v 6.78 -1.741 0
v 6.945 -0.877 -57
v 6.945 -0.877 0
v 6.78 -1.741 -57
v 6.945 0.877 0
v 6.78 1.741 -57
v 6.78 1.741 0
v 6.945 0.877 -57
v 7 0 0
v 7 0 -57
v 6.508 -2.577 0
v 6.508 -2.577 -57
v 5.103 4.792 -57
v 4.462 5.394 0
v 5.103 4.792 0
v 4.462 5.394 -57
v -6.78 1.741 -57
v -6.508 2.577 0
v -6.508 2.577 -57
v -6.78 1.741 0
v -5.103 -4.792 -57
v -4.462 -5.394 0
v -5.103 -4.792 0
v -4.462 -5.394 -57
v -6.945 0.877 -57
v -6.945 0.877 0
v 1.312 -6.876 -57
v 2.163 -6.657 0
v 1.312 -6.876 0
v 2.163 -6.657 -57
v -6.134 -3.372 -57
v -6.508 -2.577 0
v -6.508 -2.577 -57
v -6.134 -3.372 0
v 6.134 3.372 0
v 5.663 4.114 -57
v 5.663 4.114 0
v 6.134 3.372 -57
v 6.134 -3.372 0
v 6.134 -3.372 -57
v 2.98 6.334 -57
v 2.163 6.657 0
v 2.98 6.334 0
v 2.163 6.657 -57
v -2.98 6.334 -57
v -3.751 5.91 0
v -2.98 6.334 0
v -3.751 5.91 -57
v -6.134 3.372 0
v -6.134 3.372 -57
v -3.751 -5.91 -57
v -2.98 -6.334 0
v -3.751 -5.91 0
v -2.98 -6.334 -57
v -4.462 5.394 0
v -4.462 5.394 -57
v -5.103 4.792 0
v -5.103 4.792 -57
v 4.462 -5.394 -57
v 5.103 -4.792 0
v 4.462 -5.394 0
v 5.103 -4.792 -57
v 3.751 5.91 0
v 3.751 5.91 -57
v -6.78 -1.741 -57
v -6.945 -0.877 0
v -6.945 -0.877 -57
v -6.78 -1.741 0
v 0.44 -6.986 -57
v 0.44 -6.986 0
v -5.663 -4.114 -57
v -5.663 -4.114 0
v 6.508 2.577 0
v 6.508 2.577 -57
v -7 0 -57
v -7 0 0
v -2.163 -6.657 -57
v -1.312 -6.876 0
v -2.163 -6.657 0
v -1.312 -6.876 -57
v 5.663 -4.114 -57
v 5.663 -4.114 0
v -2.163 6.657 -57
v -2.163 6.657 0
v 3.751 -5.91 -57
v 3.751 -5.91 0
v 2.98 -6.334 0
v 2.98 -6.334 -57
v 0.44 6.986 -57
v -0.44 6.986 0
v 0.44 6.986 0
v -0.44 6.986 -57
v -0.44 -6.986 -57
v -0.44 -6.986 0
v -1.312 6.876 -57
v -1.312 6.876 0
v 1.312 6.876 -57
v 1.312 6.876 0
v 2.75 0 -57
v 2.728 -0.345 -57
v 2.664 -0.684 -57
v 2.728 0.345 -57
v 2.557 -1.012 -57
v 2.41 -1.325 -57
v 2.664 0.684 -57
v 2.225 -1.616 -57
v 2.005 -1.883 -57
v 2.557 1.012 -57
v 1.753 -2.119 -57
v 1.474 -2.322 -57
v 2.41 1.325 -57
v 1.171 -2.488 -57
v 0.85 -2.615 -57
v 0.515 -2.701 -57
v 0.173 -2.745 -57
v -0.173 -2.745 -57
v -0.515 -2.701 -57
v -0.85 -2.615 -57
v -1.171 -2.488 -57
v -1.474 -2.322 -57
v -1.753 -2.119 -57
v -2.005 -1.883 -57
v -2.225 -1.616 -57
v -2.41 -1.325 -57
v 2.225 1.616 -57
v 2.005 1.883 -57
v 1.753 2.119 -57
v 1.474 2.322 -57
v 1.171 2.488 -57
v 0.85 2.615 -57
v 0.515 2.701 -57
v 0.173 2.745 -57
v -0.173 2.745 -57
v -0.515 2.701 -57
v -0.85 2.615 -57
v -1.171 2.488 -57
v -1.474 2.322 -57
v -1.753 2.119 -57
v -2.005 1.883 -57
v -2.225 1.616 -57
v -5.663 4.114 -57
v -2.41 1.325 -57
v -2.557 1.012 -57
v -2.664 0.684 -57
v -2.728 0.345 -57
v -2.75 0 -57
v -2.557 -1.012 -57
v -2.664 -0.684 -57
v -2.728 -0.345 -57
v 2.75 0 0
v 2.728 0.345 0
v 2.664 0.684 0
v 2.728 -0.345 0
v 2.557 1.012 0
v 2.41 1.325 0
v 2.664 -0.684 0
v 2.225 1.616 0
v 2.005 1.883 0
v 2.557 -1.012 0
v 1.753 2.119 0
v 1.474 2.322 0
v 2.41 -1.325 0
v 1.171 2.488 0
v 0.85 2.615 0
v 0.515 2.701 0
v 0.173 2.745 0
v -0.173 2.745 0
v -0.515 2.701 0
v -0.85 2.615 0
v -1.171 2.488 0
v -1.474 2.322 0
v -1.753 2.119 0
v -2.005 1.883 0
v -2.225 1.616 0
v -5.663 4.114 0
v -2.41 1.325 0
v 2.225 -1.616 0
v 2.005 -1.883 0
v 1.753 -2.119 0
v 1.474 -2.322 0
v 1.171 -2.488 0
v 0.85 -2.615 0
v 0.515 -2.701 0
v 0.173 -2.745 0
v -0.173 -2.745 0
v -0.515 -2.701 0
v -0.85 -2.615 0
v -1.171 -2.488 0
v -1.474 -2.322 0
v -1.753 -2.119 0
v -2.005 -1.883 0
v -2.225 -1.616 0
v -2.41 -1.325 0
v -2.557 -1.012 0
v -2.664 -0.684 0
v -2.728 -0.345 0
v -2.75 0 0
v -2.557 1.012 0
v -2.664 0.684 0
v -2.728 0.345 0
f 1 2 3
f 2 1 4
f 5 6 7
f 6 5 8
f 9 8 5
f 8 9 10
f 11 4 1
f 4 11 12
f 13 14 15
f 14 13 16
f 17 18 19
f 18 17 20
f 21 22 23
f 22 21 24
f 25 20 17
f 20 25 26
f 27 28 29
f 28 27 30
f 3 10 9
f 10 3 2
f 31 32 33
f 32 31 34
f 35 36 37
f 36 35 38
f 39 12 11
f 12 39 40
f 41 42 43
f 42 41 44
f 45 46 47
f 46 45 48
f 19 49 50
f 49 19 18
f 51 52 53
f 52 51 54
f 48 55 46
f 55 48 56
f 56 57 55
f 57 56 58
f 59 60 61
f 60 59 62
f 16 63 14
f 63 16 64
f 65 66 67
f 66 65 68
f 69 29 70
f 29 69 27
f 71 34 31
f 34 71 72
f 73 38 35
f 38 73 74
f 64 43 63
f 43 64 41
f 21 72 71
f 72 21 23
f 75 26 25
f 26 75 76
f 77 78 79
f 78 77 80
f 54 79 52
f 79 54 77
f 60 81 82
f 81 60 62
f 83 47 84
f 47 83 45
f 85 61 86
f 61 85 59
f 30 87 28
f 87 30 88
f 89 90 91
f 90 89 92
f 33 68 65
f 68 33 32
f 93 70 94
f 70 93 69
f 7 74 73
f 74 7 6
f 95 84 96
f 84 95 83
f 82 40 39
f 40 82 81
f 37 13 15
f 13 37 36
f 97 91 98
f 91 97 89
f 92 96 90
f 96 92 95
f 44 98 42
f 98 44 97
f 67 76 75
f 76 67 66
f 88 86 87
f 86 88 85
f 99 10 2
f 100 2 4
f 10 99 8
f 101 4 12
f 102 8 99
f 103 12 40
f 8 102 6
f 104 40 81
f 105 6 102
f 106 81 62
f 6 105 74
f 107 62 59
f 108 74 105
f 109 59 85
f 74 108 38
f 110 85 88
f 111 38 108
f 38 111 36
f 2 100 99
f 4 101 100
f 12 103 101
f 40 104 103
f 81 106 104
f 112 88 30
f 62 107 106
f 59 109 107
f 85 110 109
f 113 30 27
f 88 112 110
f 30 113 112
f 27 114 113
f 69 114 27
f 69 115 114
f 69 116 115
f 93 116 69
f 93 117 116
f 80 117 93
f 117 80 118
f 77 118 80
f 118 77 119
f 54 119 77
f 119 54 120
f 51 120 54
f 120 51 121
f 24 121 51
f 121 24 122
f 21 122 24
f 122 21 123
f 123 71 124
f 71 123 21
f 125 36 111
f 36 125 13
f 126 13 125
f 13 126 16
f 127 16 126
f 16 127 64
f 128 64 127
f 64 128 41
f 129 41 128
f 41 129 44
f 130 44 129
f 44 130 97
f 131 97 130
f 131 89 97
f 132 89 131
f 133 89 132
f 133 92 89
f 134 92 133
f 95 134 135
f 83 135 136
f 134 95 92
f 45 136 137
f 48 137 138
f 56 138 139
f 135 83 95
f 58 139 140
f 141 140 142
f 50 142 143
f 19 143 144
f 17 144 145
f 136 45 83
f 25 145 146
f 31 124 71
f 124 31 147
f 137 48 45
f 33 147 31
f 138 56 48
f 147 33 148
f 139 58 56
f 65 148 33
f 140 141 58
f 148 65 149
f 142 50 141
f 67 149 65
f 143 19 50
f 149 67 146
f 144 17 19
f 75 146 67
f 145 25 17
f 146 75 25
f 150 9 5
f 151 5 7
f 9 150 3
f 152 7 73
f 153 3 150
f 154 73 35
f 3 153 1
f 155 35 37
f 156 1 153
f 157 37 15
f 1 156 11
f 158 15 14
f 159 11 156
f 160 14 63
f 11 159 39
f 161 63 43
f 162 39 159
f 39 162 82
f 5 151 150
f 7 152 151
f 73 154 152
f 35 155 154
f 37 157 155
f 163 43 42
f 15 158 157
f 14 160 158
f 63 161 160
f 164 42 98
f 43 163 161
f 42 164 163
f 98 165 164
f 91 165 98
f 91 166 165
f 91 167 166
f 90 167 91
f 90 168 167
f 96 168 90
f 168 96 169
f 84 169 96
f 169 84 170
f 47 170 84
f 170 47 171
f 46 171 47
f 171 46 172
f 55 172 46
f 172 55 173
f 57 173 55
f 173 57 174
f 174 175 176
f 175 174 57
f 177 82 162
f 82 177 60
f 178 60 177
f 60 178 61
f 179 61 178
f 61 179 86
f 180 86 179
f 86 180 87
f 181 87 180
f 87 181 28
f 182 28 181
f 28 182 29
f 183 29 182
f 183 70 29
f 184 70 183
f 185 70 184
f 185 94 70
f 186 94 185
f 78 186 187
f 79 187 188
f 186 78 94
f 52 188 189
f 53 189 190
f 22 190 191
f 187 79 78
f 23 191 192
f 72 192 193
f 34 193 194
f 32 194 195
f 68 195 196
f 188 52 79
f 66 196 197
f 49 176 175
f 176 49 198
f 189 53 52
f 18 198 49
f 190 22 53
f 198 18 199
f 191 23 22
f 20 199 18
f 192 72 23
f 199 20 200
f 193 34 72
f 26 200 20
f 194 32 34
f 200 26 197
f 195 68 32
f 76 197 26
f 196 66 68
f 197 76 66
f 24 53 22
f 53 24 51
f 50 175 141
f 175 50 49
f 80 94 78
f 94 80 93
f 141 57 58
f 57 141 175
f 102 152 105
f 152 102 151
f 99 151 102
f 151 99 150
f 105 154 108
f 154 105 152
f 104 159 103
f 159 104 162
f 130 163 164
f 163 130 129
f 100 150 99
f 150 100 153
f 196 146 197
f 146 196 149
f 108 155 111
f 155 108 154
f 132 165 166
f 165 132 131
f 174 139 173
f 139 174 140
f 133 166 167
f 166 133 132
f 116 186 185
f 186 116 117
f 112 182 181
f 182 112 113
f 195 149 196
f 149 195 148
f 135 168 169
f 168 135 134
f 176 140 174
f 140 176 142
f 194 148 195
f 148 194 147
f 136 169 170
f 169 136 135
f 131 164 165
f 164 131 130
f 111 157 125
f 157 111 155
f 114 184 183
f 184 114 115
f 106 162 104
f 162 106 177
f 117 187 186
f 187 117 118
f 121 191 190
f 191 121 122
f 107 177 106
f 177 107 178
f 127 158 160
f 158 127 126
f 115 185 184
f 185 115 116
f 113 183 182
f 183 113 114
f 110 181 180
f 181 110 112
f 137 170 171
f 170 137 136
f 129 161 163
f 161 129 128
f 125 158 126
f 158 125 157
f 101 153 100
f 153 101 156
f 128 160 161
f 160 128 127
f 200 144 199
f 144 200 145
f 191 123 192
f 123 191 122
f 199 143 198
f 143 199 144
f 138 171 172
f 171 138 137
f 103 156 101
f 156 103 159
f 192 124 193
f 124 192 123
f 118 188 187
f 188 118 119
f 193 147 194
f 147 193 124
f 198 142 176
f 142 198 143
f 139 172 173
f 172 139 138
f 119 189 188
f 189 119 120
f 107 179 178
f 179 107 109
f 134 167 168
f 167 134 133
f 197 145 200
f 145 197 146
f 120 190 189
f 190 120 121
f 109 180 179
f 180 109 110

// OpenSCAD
$fn = 50;


difference() {
	union() {
		translate(v = [0, 0, -57.0000000000]) {
			cylinder(h = 57, r = 7.0000000000);
		}
		cylinder(h = 0, r = 13.0000000000);
	}
	union() {
		#translate(v = [0, 0, -57]) {
			cylinder(h = 57, r = 2.7500000000);
		}
	}
}
